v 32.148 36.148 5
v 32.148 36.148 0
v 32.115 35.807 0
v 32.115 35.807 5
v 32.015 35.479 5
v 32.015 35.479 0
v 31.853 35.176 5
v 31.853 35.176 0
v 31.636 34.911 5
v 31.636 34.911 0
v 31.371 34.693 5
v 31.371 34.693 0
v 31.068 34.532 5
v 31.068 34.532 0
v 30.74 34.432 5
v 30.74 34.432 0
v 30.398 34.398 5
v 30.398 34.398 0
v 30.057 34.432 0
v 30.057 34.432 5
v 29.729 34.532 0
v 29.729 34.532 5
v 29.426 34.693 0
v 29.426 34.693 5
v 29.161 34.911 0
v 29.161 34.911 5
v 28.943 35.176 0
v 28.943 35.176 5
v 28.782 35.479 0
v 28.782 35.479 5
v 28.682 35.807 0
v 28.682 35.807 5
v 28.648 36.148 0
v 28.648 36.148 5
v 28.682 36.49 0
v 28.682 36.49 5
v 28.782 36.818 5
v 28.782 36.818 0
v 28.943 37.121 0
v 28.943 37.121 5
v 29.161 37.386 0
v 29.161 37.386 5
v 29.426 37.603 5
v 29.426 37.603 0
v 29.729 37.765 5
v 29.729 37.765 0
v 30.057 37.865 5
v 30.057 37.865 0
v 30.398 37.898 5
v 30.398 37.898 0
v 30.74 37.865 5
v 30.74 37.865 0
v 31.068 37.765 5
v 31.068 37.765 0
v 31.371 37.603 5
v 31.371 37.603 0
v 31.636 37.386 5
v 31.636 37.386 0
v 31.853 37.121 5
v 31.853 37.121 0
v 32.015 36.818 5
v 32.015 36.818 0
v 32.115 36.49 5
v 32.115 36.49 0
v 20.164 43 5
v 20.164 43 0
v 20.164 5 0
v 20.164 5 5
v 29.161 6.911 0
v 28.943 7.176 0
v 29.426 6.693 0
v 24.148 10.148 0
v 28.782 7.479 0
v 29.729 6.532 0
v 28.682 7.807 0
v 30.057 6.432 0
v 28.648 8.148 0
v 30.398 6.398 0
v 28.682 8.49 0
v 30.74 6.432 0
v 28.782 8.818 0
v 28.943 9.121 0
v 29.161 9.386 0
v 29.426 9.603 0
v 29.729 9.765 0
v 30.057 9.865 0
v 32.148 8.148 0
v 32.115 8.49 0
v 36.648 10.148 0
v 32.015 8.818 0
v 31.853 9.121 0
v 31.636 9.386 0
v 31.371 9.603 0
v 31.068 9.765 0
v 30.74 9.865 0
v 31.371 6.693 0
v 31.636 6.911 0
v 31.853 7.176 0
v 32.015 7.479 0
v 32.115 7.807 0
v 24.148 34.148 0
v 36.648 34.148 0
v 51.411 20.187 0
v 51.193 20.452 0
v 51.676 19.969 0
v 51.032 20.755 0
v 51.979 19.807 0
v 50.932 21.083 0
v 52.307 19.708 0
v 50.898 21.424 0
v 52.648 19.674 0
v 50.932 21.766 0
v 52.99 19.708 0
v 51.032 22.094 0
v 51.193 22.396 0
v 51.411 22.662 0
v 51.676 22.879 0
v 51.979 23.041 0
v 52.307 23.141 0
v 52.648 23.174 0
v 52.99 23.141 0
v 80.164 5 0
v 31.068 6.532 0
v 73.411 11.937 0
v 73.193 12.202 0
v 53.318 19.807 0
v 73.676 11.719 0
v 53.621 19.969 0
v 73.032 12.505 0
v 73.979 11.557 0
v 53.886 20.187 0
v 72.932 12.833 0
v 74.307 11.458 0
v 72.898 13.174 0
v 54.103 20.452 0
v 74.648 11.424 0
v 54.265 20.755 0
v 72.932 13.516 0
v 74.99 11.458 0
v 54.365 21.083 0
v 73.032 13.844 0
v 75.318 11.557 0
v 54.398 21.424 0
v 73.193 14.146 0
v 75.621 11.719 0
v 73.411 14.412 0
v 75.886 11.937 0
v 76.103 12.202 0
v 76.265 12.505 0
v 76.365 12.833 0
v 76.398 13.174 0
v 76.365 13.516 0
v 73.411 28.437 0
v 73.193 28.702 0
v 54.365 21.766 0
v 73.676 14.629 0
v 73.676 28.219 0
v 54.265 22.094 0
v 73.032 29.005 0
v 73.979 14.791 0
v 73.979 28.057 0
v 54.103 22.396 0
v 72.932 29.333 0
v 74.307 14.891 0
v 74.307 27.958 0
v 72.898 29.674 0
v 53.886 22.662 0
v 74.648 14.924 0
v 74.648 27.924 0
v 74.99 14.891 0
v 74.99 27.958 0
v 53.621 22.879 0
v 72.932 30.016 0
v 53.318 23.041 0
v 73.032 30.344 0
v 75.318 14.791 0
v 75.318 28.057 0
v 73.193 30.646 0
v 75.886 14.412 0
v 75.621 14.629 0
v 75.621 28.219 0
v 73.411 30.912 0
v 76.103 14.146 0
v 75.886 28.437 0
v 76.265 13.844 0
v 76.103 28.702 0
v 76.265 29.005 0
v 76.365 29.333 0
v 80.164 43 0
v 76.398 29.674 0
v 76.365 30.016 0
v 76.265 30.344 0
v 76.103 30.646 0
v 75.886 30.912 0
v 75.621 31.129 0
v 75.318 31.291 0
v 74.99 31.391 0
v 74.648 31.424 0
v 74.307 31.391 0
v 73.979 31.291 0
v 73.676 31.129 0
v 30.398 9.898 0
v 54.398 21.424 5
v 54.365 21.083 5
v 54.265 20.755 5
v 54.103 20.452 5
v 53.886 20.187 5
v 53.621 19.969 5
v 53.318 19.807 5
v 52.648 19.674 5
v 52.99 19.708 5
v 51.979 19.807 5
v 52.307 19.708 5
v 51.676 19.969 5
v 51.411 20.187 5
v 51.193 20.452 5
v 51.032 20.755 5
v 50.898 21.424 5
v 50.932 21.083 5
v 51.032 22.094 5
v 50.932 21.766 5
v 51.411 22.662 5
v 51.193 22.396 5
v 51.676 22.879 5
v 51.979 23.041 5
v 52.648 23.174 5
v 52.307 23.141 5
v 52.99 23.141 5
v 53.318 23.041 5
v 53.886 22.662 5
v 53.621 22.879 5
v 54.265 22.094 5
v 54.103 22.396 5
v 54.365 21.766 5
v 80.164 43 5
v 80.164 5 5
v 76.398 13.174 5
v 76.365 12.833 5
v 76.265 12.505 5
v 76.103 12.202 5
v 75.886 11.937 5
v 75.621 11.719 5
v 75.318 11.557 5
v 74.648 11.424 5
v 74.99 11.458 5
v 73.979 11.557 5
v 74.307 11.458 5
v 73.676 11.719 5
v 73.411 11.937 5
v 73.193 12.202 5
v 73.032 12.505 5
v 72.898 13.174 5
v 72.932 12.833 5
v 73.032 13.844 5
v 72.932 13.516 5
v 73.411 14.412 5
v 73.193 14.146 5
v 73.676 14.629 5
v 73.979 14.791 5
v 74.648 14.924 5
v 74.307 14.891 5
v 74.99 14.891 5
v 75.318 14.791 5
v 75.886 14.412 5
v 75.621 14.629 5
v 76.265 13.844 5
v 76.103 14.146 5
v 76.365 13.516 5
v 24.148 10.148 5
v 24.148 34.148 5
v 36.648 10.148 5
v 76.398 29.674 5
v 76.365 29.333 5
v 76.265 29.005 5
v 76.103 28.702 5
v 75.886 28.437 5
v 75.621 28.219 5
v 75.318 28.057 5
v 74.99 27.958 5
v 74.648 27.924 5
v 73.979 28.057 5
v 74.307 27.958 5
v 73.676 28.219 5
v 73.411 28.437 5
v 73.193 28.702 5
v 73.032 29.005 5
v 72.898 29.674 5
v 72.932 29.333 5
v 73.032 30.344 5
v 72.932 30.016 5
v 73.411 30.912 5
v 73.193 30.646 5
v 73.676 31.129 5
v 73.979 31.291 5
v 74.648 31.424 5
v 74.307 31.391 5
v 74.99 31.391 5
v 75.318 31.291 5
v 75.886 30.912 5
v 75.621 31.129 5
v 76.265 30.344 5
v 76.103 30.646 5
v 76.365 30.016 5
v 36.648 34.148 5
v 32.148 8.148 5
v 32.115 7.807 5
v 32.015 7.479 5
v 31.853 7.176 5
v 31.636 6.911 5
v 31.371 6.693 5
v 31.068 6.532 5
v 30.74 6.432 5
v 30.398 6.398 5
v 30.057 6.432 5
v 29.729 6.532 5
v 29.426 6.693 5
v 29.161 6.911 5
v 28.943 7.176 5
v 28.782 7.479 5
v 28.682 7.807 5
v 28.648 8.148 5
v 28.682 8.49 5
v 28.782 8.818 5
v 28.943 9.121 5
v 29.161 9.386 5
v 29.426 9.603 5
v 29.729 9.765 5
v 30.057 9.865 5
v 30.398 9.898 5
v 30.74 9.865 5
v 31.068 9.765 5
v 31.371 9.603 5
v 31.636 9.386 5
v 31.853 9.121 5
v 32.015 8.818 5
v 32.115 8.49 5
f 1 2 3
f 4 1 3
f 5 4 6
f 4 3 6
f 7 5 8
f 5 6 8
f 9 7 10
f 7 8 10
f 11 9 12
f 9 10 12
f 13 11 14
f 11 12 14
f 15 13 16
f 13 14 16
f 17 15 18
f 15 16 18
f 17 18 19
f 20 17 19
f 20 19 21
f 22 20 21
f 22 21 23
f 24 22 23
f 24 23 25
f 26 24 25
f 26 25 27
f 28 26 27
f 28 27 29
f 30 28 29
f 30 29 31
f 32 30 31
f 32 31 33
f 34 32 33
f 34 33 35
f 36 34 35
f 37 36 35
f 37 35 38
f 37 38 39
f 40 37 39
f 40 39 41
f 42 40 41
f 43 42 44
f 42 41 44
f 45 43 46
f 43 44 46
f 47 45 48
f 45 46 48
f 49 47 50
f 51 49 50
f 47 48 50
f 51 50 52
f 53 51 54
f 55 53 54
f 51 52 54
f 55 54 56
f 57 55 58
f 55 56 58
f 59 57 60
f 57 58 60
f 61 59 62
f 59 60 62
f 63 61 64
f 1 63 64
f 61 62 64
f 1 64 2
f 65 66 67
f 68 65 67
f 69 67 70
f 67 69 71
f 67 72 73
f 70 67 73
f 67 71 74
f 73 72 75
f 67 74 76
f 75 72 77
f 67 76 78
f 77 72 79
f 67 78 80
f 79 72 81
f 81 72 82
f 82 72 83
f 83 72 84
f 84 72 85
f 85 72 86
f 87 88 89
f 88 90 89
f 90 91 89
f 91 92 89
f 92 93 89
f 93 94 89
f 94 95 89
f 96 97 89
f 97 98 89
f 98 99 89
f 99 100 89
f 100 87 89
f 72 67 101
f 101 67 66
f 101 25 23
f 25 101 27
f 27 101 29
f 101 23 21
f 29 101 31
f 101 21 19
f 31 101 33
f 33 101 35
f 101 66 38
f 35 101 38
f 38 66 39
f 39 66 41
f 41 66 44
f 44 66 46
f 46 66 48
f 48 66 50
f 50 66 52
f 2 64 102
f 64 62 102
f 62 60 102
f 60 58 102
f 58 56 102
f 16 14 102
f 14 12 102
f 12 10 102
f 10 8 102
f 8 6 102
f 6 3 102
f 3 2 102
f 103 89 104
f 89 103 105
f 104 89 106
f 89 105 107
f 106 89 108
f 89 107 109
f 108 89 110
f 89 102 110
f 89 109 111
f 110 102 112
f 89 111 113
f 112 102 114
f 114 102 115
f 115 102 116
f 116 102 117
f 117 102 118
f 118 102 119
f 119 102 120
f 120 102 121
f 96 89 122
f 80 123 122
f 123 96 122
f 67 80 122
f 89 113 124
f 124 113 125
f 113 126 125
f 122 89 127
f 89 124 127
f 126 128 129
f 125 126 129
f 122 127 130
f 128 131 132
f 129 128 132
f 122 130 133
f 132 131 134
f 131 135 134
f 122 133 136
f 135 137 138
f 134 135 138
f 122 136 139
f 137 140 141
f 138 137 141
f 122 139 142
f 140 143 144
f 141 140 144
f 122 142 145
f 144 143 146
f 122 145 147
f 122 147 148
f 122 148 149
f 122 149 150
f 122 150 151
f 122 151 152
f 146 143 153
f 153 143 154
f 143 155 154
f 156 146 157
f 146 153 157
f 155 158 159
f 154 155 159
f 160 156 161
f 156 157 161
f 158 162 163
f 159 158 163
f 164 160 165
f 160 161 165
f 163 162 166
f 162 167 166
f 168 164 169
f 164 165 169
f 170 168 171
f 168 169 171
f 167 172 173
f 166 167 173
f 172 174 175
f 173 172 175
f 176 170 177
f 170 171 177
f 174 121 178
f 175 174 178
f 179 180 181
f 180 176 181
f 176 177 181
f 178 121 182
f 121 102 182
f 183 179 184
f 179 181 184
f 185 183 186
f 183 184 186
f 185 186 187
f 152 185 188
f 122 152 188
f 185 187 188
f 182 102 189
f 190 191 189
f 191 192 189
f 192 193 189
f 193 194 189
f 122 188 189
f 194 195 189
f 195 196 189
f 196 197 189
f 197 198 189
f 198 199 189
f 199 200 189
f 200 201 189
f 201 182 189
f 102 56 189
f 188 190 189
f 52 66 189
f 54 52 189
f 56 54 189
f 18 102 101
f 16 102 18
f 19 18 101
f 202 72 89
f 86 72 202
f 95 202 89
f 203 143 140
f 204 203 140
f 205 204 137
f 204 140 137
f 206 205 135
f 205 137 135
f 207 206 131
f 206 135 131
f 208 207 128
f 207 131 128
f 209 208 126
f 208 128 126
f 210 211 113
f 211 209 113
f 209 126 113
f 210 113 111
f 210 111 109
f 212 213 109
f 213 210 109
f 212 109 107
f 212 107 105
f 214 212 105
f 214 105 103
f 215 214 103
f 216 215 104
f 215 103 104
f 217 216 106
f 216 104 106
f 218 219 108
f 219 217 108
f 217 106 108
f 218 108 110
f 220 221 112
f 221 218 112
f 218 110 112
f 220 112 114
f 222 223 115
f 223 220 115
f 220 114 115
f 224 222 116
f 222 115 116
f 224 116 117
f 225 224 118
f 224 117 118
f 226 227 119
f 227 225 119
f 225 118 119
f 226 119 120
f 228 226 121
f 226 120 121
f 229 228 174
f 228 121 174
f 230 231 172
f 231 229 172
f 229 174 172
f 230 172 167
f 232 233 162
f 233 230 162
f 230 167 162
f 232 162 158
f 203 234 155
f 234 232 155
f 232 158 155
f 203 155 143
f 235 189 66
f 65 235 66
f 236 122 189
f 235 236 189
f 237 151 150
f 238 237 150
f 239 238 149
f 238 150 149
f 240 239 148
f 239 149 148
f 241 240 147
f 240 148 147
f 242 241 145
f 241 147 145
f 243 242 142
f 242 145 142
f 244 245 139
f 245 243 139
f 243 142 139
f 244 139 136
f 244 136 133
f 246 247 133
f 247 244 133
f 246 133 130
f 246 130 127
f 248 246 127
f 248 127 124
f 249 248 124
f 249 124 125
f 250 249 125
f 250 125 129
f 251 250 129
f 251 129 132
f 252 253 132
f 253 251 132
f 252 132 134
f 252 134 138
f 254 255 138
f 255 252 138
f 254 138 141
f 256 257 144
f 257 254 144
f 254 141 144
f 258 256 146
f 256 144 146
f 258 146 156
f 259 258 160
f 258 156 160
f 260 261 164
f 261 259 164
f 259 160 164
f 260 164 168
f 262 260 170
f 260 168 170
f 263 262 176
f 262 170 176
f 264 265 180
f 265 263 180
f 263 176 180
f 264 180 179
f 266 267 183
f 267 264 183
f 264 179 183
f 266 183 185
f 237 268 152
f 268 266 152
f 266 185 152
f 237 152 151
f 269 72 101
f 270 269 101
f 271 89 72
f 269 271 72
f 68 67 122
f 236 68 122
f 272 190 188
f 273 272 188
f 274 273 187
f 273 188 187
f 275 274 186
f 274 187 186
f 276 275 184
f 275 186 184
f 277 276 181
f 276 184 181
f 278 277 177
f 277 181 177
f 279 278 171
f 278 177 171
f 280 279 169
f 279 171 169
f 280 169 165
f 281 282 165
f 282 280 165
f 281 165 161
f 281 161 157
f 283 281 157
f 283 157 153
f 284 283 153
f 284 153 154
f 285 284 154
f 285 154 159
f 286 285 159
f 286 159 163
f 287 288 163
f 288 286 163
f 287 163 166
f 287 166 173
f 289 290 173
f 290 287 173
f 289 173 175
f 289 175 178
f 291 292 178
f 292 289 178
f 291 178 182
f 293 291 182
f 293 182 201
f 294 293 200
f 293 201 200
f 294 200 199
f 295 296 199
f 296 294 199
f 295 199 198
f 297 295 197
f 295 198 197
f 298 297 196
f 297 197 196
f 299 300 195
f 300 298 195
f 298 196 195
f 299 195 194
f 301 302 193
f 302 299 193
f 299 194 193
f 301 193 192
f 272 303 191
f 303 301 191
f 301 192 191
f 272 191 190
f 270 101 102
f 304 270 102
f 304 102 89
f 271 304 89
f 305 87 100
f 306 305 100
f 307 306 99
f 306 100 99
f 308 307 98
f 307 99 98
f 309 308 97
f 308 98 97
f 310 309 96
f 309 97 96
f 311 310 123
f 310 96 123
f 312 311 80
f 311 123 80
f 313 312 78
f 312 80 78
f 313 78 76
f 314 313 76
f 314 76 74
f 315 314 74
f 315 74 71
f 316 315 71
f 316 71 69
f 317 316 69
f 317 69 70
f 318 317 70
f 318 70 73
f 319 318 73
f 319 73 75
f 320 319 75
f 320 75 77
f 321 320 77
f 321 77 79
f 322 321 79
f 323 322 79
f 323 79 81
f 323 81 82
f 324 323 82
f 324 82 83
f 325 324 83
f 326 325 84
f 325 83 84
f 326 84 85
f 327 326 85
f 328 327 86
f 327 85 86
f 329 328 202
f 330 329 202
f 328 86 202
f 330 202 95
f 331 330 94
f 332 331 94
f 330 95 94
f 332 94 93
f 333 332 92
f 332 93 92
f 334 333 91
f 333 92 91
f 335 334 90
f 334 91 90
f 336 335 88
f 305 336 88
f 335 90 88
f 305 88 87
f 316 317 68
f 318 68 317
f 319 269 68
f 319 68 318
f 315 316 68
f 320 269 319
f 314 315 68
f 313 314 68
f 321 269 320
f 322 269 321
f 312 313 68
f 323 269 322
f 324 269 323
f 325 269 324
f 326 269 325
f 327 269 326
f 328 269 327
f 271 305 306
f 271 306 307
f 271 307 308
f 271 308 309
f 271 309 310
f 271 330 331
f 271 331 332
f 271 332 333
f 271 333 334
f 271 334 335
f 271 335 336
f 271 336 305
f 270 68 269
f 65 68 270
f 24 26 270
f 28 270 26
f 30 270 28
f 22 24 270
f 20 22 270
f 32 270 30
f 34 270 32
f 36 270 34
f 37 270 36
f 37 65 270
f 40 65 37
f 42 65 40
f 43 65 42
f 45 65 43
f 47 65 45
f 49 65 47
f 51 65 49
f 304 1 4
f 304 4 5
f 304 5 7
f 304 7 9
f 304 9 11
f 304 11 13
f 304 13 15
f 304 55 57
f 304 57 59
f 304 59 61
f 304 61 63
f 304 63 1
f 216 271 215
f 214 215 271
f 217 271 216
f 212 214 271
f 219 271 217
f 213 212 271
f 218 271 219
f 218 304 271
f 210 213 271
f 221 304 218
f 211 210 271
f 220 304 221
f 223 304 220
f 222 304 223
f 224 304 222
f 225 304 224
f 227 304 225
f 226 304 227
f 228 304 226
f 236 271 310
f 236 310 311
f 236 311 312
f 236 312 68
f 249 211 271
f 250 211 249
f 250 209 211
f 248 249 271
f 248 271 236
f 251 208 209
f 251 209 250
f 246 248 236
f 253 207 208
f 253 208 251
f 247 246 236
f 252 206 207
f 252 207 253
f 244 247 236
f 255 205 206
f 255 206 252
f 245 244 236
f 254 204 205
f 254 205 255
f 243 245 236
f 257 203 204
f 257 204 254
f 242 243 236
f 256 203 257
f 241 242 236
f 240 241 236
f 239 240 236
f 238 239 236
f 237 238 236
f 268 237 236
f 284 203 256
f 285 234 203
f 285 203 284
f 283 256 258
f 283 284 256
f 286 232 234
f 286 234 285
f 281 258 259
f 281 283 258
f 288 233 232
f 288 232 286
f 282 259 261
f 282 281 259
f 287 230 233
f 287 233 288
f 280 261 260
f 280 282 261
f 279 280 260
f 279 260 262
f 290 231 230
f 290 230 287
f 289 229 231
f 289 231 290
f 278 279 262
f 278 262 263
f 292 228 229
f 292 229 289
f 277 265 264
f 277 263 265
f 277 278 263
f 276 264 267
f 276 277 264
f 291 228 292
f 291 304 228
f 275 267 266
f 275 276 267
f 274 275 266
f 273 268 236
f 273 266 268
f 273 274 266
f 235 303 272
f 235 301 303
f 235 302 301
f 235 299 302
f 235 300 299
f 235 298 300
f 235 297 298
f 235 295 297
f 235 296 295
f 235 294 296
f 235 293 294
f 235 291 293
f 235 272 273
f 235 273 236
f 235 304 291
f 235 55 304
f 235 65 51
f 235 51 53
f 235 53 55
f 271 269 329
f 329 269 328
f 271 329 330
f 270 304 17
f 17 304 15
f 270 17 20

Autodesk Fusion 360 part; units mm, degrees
sketch "Sketch1" plane through (0, 0, 0) normal (0, 0, 1) x (1, 0, 0)
  line L0 (20.1643, 5) -> (80.1643, 5)
  line L1 (80.1643, 5) -> (80.1643, 43)
  line L2 (80.1643, 43) -> (20.1643, 43)
  line L3 (20.1643, 43) -> (20.1643, 5)
  line L4 (24.1483, 34.1483) -> (36.6483, 34.1483)
  line L5 (36.6483, 34.1483) -> (36.6483, 10.1483)
  line L6 (36.6483, 10.1483) -> (24.1483, 10.1483)
  line L7 (24.1483, 10.1483) -> (24.1483, 34.1483)
  circle A0 centre (74.6483, 29.6742) radius 1.75
  circle A1 centre (74.6483, 13.1742) radius 1.75
  line L8 (74.6483, 29.6742) -> (74.6483, 13.1742)
  line L9 (74.6483, 21.4242) -> (52.6483, 21.4242)
  circle A2 centre (52.6483, 21.4242) radius 1.75
  line L10 (95, 35) -> (105, 35)
  line L11 (105, 35) -> (105, 25)
  line L12 (105, 25) -> (95, 25)
  line L13 (95, 25) -> (95, 35)
  circle A3 centre (100, 30) radius 1.75
  circle A4 centre (30.3983, 8.1483) radius 1.75
  line L14 (24.1483, 22.1483) -> (9, 22.1483) construction
  circle A5 centre (30.3983, 36.1483) radius 1.75
  line L15 (80.1643, 27.7253) -> (80.1643, 24.8327)
  line L16 (36.6483, 24.8327) -> (36.6483, 27.7253)
  dimension "d1" = 60
  dimension "d2" = 38
  dimension "d3" = 24
  dimension "d4" = 12.5
  dimension "d6" = 3.5
  dimension "d7" = 16.5
  dimension "d8" = 3.5
  dimension "d9" = 38
  dimension "d10" = 22
  dimension "d11" = 3.5
  dimension "d12" = 3.5
  dimension "d16" = 3.5
  dimension "d17" = 2
extrude "Extrude1" add sketch "Sketch1" along normal blind 5 contours L0 L1 L2 L3 L15 | L10 L11 L12 L13 | A4 | A5 makes body 1 at (41.3983, 21.907, 0) makes body 2 at (99.9564, 33.915, 0)
extrude "Extrude2" cut sketch "Sketch1" along normal blind 100 contours A4 | A5 bodies 1
delete_body "RemoveBody1" bodies 2
